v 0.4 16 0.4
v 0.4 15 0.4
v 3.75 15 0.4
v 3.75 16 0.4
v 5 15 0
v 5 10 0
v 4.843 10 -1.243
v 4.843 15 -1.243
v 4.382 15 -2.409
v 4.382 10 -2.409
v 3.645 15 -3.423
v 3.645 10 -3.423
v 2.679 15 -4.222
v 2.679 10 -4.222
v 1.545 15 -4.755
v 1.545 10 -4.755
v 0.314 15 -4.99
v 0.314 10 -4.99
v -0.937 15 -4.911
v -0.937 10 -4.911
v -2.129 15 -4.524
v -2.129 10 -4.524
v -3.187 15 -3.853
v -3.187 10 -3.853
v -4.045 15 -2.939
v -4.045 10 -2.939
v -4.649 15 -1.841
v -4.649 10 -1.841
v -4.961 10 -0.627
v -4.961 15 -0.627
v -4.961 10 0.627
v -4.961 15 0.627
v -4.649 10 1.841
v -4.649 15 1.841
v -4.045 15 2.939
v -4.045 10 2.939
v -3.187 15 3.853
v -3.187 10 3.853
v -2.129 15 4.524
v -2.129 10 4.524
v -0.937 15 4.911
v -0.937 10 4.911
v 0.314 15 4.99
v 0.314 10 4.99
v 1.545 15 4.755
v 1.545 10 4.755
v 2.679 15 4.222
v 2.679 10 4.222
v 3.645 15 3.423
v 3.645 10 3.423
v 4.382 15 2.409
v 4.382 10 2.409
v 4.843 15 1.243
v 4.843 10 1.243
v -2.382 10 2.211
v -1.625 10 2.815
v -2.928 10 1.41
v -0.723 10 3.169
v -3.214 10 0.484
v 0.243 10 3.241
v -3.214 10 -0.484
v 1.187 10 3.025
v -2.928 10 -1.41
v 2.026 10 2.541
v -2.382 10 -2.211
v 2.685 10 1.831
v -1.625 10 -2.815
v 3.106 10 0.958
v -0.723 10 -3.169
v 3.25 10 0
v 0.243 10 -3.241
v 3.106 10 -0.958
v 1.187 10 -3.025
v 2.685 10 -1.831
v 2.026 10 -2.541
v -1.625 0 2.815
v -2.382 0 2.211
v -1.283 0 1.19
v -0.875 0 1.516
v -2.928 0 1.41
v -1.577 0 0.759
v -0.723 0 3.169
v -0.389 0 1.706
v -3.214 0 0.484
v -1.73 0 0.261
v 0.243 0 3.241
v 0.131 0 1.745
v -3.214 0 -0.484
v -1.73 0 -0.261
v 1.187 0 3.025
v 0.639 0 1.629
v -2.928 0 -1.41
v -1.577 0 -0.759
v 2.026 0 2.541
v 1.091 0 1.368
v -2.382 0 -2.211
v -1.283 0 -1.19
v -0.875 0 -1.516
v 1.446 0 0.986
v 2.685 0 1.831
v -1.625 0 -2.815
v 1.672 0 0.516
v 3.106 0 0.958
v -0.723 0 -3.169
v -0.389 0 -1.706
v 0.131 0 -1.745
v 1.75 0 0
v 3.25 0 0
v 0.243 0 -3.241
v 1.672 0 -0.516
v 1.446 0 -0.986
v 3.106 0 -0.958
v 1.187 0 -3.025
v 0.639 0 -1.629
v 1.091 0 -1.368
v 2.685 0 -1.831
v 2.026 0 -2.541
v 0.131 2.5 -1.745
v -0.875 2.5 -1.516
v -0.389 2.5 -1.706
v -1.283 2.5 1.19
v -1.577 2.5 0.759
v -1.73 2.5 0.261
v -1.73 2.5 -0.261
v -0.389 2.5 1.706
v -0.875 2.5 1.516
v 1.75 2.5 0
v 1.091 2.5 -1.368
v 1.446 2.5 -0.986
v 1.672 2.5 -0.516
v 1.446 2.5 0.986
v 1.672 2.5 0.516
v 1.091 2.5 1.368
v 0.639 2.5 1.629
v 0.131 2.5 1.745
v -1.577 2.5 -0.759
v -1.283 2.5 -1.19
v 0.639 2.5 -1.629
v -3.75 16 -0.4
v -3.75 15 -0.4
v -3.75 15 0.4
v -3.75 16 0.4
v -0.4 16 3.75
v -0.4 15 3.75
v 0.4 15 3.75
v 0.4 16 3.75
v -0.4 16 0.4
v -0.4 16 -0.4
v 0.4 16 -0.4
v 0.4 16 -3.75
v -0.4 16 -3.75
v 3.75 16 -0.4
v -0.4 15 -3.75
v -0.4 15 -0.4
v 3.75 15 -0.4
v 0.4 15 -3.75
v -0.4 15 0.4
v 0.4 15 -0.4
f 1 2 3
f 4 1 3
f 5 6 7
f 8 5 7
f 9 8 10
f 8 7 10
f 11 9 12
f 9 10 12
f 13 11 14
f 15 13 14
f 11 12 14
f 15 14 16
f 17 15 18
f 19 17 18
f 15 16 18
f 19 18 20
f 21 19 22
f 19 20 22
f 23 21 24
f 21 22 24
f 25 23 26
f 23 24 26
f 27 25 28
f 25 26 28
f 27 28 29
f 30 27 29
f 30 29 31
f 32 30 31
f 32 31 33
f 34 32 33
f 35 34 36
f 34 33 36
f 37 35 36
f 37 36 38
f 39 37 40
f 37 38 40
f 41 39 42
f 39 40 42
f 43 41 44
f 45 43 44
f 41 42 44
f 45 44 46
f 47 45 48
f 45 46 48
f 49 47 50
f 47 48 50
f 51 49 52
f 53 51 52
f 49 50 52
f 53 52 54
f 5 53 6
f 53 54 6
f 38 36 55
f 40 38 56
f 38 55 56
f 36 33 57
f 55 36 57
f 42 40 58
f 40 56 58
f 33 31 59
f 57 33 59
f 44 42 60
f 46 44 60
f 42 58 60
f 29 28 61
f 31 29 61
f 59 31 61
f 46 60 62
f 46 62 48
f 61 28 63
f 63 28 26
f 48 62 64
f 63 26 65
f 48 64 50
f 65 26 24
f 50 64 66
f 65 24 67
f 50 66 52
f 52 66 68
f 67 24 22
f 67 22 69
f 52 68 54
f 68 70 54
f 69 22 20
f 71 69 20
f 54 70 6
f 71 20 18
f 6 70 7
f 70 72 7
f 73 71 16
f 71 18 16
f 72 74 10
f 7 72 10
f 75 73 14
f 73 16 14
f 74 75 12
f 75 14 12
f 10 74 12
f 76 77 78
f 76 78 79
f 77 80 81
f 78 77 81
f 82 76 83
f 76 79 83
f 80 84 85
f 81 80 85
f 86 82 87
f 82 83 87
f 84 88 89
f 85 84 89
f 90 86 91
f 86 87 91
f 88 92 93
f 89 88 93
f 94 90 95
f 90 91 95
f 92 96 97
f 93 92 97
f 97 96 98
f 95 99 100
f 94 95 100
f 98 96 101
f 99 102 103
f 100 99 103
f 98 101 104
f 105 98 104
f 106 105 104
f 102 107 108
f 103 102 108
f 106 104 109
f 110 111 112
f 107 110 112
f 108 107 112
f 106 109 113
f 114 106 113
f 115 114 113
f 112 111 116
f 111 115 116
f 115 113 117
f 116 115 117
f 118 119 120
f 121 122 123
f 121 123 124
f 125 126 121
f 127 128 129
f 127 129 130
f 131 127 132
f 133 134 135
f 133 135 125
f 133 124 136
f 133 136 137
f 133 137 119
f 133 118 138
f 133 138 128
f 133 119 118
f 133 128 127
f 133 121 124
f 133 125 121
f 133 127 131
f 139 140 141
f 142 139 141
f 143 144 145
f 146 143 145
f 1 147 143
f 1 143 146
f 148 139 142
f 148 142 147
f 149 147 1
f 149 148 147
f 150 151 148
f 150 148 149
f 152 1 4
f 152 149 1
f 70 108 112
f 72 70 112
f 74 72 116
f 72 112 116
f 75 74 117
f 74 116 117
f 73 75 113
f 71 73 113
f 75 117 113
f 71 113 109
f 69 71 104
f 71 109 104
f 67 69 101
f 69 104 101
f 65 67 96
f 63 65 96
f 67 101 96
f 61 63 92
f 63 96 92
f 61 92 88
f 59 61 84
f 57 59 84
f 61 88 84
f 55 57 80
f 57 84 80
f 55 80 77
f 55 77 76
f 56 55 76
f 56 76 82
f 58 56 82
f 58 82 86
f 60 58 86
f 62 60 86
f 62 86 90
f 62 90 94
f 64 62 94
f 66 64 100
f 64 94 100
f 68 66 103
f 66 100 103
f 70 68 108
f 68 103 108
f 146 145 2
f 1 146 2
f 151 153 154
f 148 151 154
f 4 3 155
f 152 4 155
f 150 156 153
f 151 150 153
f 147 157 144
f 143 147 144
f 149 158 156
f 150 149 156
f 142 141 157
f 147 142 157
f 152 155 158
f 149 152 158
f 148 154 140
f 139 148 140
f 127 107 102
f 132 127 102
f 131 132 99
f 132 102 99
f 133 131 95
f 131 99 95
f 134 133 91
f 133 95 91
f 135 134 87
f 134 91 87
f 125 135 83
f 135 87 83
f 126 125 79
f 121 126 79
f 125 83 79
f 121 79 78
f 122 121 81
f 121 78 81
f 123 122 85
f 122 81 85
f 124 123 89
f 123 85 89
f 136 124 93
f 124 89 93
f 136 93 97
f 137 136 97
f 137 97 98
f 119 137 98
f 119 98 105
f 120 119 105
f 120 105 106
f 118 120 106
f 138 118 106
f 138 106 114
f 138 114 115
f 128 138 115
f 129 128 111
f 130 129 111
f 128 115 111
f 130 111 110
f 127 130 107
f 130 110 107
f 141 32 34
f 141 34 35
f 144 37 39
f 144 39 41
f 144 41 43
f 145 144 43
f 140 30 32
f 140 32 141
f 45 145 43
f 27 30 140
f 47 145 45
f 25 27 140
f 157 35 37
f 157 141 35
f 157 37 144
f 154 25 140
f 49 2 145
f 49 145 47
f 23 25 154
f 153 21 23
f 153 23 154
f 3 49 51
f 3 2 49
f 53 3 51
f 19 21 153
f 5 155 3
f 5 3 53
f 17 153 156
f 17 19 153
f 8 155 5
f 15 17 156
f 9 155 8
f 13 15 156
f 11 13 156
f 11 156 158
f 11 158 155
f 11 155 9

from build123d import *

# Parameters (mm, degrees)
SKETCH1_R           = 3.25
BOSS_EXTRUDE1_DEPTH = 10
SKETCH2_R           = 1.75
CUT_EXTRUDE1_DEPTH  = 2.5
SKETCH6_R           = 5
BOSS_EXTRUDE2_DEPTH = 5
BOSS_EXTRUDE3_DEPTH = 1


with BuildPart() as part:
    # Sketch1 → Boss-Extrude1 (new body)
    with BuildSketch(Plane(origin=(0, 0, 0), x_dir=(1, 0, 0), z_dir=(0, 1, 0))):
        Circle(SKETCH1_R)
    extrude(amount=BOSS_EXTRUDE1_DEPTH)

    # Sketch2 → Cut-Extrude1 (cut)
    with BuildSketch(Plane.XZ):
        Circle(SKETCH2_R)
    extrude(amount=-CUT_EXTRUDE1_DEPTH, mode=Mode.SUBTRACT)

    # Sketch6 → Boss-Extrude2 (add)
    with BuildSketch(Plane(origin=(0, 10, 0), x_dir=(1, 0, 0), z_dir=(0, 1, 0))):
        Circle(SKETCH6_R)
    extrude(amount=BOSS_EXTRUDE2_DEPTH)

    # Sketch8 → Boss-Extrude3 (add)
    with BuildSketch(Plane(origin=(0, 15, 0), x_dir=(1, 0, 0), z_dir=(0, 1, 0))):
        Polygon((0.4, 3.75), (-0.4, 3.75), (-0.4, 0.4), (-3.75, 0.4), (-3.75, -0.4), (-0.4, -0.4), (-0.4, -3.75), (0.4, -3.75), (0.4, -0.4), (3.75, -0.4), (3.75, 0.4), (0.4, 0.4), align=None)
    extrude(amount=BOSS_EXTRUDE3_DEPTH)


solid = part.part
